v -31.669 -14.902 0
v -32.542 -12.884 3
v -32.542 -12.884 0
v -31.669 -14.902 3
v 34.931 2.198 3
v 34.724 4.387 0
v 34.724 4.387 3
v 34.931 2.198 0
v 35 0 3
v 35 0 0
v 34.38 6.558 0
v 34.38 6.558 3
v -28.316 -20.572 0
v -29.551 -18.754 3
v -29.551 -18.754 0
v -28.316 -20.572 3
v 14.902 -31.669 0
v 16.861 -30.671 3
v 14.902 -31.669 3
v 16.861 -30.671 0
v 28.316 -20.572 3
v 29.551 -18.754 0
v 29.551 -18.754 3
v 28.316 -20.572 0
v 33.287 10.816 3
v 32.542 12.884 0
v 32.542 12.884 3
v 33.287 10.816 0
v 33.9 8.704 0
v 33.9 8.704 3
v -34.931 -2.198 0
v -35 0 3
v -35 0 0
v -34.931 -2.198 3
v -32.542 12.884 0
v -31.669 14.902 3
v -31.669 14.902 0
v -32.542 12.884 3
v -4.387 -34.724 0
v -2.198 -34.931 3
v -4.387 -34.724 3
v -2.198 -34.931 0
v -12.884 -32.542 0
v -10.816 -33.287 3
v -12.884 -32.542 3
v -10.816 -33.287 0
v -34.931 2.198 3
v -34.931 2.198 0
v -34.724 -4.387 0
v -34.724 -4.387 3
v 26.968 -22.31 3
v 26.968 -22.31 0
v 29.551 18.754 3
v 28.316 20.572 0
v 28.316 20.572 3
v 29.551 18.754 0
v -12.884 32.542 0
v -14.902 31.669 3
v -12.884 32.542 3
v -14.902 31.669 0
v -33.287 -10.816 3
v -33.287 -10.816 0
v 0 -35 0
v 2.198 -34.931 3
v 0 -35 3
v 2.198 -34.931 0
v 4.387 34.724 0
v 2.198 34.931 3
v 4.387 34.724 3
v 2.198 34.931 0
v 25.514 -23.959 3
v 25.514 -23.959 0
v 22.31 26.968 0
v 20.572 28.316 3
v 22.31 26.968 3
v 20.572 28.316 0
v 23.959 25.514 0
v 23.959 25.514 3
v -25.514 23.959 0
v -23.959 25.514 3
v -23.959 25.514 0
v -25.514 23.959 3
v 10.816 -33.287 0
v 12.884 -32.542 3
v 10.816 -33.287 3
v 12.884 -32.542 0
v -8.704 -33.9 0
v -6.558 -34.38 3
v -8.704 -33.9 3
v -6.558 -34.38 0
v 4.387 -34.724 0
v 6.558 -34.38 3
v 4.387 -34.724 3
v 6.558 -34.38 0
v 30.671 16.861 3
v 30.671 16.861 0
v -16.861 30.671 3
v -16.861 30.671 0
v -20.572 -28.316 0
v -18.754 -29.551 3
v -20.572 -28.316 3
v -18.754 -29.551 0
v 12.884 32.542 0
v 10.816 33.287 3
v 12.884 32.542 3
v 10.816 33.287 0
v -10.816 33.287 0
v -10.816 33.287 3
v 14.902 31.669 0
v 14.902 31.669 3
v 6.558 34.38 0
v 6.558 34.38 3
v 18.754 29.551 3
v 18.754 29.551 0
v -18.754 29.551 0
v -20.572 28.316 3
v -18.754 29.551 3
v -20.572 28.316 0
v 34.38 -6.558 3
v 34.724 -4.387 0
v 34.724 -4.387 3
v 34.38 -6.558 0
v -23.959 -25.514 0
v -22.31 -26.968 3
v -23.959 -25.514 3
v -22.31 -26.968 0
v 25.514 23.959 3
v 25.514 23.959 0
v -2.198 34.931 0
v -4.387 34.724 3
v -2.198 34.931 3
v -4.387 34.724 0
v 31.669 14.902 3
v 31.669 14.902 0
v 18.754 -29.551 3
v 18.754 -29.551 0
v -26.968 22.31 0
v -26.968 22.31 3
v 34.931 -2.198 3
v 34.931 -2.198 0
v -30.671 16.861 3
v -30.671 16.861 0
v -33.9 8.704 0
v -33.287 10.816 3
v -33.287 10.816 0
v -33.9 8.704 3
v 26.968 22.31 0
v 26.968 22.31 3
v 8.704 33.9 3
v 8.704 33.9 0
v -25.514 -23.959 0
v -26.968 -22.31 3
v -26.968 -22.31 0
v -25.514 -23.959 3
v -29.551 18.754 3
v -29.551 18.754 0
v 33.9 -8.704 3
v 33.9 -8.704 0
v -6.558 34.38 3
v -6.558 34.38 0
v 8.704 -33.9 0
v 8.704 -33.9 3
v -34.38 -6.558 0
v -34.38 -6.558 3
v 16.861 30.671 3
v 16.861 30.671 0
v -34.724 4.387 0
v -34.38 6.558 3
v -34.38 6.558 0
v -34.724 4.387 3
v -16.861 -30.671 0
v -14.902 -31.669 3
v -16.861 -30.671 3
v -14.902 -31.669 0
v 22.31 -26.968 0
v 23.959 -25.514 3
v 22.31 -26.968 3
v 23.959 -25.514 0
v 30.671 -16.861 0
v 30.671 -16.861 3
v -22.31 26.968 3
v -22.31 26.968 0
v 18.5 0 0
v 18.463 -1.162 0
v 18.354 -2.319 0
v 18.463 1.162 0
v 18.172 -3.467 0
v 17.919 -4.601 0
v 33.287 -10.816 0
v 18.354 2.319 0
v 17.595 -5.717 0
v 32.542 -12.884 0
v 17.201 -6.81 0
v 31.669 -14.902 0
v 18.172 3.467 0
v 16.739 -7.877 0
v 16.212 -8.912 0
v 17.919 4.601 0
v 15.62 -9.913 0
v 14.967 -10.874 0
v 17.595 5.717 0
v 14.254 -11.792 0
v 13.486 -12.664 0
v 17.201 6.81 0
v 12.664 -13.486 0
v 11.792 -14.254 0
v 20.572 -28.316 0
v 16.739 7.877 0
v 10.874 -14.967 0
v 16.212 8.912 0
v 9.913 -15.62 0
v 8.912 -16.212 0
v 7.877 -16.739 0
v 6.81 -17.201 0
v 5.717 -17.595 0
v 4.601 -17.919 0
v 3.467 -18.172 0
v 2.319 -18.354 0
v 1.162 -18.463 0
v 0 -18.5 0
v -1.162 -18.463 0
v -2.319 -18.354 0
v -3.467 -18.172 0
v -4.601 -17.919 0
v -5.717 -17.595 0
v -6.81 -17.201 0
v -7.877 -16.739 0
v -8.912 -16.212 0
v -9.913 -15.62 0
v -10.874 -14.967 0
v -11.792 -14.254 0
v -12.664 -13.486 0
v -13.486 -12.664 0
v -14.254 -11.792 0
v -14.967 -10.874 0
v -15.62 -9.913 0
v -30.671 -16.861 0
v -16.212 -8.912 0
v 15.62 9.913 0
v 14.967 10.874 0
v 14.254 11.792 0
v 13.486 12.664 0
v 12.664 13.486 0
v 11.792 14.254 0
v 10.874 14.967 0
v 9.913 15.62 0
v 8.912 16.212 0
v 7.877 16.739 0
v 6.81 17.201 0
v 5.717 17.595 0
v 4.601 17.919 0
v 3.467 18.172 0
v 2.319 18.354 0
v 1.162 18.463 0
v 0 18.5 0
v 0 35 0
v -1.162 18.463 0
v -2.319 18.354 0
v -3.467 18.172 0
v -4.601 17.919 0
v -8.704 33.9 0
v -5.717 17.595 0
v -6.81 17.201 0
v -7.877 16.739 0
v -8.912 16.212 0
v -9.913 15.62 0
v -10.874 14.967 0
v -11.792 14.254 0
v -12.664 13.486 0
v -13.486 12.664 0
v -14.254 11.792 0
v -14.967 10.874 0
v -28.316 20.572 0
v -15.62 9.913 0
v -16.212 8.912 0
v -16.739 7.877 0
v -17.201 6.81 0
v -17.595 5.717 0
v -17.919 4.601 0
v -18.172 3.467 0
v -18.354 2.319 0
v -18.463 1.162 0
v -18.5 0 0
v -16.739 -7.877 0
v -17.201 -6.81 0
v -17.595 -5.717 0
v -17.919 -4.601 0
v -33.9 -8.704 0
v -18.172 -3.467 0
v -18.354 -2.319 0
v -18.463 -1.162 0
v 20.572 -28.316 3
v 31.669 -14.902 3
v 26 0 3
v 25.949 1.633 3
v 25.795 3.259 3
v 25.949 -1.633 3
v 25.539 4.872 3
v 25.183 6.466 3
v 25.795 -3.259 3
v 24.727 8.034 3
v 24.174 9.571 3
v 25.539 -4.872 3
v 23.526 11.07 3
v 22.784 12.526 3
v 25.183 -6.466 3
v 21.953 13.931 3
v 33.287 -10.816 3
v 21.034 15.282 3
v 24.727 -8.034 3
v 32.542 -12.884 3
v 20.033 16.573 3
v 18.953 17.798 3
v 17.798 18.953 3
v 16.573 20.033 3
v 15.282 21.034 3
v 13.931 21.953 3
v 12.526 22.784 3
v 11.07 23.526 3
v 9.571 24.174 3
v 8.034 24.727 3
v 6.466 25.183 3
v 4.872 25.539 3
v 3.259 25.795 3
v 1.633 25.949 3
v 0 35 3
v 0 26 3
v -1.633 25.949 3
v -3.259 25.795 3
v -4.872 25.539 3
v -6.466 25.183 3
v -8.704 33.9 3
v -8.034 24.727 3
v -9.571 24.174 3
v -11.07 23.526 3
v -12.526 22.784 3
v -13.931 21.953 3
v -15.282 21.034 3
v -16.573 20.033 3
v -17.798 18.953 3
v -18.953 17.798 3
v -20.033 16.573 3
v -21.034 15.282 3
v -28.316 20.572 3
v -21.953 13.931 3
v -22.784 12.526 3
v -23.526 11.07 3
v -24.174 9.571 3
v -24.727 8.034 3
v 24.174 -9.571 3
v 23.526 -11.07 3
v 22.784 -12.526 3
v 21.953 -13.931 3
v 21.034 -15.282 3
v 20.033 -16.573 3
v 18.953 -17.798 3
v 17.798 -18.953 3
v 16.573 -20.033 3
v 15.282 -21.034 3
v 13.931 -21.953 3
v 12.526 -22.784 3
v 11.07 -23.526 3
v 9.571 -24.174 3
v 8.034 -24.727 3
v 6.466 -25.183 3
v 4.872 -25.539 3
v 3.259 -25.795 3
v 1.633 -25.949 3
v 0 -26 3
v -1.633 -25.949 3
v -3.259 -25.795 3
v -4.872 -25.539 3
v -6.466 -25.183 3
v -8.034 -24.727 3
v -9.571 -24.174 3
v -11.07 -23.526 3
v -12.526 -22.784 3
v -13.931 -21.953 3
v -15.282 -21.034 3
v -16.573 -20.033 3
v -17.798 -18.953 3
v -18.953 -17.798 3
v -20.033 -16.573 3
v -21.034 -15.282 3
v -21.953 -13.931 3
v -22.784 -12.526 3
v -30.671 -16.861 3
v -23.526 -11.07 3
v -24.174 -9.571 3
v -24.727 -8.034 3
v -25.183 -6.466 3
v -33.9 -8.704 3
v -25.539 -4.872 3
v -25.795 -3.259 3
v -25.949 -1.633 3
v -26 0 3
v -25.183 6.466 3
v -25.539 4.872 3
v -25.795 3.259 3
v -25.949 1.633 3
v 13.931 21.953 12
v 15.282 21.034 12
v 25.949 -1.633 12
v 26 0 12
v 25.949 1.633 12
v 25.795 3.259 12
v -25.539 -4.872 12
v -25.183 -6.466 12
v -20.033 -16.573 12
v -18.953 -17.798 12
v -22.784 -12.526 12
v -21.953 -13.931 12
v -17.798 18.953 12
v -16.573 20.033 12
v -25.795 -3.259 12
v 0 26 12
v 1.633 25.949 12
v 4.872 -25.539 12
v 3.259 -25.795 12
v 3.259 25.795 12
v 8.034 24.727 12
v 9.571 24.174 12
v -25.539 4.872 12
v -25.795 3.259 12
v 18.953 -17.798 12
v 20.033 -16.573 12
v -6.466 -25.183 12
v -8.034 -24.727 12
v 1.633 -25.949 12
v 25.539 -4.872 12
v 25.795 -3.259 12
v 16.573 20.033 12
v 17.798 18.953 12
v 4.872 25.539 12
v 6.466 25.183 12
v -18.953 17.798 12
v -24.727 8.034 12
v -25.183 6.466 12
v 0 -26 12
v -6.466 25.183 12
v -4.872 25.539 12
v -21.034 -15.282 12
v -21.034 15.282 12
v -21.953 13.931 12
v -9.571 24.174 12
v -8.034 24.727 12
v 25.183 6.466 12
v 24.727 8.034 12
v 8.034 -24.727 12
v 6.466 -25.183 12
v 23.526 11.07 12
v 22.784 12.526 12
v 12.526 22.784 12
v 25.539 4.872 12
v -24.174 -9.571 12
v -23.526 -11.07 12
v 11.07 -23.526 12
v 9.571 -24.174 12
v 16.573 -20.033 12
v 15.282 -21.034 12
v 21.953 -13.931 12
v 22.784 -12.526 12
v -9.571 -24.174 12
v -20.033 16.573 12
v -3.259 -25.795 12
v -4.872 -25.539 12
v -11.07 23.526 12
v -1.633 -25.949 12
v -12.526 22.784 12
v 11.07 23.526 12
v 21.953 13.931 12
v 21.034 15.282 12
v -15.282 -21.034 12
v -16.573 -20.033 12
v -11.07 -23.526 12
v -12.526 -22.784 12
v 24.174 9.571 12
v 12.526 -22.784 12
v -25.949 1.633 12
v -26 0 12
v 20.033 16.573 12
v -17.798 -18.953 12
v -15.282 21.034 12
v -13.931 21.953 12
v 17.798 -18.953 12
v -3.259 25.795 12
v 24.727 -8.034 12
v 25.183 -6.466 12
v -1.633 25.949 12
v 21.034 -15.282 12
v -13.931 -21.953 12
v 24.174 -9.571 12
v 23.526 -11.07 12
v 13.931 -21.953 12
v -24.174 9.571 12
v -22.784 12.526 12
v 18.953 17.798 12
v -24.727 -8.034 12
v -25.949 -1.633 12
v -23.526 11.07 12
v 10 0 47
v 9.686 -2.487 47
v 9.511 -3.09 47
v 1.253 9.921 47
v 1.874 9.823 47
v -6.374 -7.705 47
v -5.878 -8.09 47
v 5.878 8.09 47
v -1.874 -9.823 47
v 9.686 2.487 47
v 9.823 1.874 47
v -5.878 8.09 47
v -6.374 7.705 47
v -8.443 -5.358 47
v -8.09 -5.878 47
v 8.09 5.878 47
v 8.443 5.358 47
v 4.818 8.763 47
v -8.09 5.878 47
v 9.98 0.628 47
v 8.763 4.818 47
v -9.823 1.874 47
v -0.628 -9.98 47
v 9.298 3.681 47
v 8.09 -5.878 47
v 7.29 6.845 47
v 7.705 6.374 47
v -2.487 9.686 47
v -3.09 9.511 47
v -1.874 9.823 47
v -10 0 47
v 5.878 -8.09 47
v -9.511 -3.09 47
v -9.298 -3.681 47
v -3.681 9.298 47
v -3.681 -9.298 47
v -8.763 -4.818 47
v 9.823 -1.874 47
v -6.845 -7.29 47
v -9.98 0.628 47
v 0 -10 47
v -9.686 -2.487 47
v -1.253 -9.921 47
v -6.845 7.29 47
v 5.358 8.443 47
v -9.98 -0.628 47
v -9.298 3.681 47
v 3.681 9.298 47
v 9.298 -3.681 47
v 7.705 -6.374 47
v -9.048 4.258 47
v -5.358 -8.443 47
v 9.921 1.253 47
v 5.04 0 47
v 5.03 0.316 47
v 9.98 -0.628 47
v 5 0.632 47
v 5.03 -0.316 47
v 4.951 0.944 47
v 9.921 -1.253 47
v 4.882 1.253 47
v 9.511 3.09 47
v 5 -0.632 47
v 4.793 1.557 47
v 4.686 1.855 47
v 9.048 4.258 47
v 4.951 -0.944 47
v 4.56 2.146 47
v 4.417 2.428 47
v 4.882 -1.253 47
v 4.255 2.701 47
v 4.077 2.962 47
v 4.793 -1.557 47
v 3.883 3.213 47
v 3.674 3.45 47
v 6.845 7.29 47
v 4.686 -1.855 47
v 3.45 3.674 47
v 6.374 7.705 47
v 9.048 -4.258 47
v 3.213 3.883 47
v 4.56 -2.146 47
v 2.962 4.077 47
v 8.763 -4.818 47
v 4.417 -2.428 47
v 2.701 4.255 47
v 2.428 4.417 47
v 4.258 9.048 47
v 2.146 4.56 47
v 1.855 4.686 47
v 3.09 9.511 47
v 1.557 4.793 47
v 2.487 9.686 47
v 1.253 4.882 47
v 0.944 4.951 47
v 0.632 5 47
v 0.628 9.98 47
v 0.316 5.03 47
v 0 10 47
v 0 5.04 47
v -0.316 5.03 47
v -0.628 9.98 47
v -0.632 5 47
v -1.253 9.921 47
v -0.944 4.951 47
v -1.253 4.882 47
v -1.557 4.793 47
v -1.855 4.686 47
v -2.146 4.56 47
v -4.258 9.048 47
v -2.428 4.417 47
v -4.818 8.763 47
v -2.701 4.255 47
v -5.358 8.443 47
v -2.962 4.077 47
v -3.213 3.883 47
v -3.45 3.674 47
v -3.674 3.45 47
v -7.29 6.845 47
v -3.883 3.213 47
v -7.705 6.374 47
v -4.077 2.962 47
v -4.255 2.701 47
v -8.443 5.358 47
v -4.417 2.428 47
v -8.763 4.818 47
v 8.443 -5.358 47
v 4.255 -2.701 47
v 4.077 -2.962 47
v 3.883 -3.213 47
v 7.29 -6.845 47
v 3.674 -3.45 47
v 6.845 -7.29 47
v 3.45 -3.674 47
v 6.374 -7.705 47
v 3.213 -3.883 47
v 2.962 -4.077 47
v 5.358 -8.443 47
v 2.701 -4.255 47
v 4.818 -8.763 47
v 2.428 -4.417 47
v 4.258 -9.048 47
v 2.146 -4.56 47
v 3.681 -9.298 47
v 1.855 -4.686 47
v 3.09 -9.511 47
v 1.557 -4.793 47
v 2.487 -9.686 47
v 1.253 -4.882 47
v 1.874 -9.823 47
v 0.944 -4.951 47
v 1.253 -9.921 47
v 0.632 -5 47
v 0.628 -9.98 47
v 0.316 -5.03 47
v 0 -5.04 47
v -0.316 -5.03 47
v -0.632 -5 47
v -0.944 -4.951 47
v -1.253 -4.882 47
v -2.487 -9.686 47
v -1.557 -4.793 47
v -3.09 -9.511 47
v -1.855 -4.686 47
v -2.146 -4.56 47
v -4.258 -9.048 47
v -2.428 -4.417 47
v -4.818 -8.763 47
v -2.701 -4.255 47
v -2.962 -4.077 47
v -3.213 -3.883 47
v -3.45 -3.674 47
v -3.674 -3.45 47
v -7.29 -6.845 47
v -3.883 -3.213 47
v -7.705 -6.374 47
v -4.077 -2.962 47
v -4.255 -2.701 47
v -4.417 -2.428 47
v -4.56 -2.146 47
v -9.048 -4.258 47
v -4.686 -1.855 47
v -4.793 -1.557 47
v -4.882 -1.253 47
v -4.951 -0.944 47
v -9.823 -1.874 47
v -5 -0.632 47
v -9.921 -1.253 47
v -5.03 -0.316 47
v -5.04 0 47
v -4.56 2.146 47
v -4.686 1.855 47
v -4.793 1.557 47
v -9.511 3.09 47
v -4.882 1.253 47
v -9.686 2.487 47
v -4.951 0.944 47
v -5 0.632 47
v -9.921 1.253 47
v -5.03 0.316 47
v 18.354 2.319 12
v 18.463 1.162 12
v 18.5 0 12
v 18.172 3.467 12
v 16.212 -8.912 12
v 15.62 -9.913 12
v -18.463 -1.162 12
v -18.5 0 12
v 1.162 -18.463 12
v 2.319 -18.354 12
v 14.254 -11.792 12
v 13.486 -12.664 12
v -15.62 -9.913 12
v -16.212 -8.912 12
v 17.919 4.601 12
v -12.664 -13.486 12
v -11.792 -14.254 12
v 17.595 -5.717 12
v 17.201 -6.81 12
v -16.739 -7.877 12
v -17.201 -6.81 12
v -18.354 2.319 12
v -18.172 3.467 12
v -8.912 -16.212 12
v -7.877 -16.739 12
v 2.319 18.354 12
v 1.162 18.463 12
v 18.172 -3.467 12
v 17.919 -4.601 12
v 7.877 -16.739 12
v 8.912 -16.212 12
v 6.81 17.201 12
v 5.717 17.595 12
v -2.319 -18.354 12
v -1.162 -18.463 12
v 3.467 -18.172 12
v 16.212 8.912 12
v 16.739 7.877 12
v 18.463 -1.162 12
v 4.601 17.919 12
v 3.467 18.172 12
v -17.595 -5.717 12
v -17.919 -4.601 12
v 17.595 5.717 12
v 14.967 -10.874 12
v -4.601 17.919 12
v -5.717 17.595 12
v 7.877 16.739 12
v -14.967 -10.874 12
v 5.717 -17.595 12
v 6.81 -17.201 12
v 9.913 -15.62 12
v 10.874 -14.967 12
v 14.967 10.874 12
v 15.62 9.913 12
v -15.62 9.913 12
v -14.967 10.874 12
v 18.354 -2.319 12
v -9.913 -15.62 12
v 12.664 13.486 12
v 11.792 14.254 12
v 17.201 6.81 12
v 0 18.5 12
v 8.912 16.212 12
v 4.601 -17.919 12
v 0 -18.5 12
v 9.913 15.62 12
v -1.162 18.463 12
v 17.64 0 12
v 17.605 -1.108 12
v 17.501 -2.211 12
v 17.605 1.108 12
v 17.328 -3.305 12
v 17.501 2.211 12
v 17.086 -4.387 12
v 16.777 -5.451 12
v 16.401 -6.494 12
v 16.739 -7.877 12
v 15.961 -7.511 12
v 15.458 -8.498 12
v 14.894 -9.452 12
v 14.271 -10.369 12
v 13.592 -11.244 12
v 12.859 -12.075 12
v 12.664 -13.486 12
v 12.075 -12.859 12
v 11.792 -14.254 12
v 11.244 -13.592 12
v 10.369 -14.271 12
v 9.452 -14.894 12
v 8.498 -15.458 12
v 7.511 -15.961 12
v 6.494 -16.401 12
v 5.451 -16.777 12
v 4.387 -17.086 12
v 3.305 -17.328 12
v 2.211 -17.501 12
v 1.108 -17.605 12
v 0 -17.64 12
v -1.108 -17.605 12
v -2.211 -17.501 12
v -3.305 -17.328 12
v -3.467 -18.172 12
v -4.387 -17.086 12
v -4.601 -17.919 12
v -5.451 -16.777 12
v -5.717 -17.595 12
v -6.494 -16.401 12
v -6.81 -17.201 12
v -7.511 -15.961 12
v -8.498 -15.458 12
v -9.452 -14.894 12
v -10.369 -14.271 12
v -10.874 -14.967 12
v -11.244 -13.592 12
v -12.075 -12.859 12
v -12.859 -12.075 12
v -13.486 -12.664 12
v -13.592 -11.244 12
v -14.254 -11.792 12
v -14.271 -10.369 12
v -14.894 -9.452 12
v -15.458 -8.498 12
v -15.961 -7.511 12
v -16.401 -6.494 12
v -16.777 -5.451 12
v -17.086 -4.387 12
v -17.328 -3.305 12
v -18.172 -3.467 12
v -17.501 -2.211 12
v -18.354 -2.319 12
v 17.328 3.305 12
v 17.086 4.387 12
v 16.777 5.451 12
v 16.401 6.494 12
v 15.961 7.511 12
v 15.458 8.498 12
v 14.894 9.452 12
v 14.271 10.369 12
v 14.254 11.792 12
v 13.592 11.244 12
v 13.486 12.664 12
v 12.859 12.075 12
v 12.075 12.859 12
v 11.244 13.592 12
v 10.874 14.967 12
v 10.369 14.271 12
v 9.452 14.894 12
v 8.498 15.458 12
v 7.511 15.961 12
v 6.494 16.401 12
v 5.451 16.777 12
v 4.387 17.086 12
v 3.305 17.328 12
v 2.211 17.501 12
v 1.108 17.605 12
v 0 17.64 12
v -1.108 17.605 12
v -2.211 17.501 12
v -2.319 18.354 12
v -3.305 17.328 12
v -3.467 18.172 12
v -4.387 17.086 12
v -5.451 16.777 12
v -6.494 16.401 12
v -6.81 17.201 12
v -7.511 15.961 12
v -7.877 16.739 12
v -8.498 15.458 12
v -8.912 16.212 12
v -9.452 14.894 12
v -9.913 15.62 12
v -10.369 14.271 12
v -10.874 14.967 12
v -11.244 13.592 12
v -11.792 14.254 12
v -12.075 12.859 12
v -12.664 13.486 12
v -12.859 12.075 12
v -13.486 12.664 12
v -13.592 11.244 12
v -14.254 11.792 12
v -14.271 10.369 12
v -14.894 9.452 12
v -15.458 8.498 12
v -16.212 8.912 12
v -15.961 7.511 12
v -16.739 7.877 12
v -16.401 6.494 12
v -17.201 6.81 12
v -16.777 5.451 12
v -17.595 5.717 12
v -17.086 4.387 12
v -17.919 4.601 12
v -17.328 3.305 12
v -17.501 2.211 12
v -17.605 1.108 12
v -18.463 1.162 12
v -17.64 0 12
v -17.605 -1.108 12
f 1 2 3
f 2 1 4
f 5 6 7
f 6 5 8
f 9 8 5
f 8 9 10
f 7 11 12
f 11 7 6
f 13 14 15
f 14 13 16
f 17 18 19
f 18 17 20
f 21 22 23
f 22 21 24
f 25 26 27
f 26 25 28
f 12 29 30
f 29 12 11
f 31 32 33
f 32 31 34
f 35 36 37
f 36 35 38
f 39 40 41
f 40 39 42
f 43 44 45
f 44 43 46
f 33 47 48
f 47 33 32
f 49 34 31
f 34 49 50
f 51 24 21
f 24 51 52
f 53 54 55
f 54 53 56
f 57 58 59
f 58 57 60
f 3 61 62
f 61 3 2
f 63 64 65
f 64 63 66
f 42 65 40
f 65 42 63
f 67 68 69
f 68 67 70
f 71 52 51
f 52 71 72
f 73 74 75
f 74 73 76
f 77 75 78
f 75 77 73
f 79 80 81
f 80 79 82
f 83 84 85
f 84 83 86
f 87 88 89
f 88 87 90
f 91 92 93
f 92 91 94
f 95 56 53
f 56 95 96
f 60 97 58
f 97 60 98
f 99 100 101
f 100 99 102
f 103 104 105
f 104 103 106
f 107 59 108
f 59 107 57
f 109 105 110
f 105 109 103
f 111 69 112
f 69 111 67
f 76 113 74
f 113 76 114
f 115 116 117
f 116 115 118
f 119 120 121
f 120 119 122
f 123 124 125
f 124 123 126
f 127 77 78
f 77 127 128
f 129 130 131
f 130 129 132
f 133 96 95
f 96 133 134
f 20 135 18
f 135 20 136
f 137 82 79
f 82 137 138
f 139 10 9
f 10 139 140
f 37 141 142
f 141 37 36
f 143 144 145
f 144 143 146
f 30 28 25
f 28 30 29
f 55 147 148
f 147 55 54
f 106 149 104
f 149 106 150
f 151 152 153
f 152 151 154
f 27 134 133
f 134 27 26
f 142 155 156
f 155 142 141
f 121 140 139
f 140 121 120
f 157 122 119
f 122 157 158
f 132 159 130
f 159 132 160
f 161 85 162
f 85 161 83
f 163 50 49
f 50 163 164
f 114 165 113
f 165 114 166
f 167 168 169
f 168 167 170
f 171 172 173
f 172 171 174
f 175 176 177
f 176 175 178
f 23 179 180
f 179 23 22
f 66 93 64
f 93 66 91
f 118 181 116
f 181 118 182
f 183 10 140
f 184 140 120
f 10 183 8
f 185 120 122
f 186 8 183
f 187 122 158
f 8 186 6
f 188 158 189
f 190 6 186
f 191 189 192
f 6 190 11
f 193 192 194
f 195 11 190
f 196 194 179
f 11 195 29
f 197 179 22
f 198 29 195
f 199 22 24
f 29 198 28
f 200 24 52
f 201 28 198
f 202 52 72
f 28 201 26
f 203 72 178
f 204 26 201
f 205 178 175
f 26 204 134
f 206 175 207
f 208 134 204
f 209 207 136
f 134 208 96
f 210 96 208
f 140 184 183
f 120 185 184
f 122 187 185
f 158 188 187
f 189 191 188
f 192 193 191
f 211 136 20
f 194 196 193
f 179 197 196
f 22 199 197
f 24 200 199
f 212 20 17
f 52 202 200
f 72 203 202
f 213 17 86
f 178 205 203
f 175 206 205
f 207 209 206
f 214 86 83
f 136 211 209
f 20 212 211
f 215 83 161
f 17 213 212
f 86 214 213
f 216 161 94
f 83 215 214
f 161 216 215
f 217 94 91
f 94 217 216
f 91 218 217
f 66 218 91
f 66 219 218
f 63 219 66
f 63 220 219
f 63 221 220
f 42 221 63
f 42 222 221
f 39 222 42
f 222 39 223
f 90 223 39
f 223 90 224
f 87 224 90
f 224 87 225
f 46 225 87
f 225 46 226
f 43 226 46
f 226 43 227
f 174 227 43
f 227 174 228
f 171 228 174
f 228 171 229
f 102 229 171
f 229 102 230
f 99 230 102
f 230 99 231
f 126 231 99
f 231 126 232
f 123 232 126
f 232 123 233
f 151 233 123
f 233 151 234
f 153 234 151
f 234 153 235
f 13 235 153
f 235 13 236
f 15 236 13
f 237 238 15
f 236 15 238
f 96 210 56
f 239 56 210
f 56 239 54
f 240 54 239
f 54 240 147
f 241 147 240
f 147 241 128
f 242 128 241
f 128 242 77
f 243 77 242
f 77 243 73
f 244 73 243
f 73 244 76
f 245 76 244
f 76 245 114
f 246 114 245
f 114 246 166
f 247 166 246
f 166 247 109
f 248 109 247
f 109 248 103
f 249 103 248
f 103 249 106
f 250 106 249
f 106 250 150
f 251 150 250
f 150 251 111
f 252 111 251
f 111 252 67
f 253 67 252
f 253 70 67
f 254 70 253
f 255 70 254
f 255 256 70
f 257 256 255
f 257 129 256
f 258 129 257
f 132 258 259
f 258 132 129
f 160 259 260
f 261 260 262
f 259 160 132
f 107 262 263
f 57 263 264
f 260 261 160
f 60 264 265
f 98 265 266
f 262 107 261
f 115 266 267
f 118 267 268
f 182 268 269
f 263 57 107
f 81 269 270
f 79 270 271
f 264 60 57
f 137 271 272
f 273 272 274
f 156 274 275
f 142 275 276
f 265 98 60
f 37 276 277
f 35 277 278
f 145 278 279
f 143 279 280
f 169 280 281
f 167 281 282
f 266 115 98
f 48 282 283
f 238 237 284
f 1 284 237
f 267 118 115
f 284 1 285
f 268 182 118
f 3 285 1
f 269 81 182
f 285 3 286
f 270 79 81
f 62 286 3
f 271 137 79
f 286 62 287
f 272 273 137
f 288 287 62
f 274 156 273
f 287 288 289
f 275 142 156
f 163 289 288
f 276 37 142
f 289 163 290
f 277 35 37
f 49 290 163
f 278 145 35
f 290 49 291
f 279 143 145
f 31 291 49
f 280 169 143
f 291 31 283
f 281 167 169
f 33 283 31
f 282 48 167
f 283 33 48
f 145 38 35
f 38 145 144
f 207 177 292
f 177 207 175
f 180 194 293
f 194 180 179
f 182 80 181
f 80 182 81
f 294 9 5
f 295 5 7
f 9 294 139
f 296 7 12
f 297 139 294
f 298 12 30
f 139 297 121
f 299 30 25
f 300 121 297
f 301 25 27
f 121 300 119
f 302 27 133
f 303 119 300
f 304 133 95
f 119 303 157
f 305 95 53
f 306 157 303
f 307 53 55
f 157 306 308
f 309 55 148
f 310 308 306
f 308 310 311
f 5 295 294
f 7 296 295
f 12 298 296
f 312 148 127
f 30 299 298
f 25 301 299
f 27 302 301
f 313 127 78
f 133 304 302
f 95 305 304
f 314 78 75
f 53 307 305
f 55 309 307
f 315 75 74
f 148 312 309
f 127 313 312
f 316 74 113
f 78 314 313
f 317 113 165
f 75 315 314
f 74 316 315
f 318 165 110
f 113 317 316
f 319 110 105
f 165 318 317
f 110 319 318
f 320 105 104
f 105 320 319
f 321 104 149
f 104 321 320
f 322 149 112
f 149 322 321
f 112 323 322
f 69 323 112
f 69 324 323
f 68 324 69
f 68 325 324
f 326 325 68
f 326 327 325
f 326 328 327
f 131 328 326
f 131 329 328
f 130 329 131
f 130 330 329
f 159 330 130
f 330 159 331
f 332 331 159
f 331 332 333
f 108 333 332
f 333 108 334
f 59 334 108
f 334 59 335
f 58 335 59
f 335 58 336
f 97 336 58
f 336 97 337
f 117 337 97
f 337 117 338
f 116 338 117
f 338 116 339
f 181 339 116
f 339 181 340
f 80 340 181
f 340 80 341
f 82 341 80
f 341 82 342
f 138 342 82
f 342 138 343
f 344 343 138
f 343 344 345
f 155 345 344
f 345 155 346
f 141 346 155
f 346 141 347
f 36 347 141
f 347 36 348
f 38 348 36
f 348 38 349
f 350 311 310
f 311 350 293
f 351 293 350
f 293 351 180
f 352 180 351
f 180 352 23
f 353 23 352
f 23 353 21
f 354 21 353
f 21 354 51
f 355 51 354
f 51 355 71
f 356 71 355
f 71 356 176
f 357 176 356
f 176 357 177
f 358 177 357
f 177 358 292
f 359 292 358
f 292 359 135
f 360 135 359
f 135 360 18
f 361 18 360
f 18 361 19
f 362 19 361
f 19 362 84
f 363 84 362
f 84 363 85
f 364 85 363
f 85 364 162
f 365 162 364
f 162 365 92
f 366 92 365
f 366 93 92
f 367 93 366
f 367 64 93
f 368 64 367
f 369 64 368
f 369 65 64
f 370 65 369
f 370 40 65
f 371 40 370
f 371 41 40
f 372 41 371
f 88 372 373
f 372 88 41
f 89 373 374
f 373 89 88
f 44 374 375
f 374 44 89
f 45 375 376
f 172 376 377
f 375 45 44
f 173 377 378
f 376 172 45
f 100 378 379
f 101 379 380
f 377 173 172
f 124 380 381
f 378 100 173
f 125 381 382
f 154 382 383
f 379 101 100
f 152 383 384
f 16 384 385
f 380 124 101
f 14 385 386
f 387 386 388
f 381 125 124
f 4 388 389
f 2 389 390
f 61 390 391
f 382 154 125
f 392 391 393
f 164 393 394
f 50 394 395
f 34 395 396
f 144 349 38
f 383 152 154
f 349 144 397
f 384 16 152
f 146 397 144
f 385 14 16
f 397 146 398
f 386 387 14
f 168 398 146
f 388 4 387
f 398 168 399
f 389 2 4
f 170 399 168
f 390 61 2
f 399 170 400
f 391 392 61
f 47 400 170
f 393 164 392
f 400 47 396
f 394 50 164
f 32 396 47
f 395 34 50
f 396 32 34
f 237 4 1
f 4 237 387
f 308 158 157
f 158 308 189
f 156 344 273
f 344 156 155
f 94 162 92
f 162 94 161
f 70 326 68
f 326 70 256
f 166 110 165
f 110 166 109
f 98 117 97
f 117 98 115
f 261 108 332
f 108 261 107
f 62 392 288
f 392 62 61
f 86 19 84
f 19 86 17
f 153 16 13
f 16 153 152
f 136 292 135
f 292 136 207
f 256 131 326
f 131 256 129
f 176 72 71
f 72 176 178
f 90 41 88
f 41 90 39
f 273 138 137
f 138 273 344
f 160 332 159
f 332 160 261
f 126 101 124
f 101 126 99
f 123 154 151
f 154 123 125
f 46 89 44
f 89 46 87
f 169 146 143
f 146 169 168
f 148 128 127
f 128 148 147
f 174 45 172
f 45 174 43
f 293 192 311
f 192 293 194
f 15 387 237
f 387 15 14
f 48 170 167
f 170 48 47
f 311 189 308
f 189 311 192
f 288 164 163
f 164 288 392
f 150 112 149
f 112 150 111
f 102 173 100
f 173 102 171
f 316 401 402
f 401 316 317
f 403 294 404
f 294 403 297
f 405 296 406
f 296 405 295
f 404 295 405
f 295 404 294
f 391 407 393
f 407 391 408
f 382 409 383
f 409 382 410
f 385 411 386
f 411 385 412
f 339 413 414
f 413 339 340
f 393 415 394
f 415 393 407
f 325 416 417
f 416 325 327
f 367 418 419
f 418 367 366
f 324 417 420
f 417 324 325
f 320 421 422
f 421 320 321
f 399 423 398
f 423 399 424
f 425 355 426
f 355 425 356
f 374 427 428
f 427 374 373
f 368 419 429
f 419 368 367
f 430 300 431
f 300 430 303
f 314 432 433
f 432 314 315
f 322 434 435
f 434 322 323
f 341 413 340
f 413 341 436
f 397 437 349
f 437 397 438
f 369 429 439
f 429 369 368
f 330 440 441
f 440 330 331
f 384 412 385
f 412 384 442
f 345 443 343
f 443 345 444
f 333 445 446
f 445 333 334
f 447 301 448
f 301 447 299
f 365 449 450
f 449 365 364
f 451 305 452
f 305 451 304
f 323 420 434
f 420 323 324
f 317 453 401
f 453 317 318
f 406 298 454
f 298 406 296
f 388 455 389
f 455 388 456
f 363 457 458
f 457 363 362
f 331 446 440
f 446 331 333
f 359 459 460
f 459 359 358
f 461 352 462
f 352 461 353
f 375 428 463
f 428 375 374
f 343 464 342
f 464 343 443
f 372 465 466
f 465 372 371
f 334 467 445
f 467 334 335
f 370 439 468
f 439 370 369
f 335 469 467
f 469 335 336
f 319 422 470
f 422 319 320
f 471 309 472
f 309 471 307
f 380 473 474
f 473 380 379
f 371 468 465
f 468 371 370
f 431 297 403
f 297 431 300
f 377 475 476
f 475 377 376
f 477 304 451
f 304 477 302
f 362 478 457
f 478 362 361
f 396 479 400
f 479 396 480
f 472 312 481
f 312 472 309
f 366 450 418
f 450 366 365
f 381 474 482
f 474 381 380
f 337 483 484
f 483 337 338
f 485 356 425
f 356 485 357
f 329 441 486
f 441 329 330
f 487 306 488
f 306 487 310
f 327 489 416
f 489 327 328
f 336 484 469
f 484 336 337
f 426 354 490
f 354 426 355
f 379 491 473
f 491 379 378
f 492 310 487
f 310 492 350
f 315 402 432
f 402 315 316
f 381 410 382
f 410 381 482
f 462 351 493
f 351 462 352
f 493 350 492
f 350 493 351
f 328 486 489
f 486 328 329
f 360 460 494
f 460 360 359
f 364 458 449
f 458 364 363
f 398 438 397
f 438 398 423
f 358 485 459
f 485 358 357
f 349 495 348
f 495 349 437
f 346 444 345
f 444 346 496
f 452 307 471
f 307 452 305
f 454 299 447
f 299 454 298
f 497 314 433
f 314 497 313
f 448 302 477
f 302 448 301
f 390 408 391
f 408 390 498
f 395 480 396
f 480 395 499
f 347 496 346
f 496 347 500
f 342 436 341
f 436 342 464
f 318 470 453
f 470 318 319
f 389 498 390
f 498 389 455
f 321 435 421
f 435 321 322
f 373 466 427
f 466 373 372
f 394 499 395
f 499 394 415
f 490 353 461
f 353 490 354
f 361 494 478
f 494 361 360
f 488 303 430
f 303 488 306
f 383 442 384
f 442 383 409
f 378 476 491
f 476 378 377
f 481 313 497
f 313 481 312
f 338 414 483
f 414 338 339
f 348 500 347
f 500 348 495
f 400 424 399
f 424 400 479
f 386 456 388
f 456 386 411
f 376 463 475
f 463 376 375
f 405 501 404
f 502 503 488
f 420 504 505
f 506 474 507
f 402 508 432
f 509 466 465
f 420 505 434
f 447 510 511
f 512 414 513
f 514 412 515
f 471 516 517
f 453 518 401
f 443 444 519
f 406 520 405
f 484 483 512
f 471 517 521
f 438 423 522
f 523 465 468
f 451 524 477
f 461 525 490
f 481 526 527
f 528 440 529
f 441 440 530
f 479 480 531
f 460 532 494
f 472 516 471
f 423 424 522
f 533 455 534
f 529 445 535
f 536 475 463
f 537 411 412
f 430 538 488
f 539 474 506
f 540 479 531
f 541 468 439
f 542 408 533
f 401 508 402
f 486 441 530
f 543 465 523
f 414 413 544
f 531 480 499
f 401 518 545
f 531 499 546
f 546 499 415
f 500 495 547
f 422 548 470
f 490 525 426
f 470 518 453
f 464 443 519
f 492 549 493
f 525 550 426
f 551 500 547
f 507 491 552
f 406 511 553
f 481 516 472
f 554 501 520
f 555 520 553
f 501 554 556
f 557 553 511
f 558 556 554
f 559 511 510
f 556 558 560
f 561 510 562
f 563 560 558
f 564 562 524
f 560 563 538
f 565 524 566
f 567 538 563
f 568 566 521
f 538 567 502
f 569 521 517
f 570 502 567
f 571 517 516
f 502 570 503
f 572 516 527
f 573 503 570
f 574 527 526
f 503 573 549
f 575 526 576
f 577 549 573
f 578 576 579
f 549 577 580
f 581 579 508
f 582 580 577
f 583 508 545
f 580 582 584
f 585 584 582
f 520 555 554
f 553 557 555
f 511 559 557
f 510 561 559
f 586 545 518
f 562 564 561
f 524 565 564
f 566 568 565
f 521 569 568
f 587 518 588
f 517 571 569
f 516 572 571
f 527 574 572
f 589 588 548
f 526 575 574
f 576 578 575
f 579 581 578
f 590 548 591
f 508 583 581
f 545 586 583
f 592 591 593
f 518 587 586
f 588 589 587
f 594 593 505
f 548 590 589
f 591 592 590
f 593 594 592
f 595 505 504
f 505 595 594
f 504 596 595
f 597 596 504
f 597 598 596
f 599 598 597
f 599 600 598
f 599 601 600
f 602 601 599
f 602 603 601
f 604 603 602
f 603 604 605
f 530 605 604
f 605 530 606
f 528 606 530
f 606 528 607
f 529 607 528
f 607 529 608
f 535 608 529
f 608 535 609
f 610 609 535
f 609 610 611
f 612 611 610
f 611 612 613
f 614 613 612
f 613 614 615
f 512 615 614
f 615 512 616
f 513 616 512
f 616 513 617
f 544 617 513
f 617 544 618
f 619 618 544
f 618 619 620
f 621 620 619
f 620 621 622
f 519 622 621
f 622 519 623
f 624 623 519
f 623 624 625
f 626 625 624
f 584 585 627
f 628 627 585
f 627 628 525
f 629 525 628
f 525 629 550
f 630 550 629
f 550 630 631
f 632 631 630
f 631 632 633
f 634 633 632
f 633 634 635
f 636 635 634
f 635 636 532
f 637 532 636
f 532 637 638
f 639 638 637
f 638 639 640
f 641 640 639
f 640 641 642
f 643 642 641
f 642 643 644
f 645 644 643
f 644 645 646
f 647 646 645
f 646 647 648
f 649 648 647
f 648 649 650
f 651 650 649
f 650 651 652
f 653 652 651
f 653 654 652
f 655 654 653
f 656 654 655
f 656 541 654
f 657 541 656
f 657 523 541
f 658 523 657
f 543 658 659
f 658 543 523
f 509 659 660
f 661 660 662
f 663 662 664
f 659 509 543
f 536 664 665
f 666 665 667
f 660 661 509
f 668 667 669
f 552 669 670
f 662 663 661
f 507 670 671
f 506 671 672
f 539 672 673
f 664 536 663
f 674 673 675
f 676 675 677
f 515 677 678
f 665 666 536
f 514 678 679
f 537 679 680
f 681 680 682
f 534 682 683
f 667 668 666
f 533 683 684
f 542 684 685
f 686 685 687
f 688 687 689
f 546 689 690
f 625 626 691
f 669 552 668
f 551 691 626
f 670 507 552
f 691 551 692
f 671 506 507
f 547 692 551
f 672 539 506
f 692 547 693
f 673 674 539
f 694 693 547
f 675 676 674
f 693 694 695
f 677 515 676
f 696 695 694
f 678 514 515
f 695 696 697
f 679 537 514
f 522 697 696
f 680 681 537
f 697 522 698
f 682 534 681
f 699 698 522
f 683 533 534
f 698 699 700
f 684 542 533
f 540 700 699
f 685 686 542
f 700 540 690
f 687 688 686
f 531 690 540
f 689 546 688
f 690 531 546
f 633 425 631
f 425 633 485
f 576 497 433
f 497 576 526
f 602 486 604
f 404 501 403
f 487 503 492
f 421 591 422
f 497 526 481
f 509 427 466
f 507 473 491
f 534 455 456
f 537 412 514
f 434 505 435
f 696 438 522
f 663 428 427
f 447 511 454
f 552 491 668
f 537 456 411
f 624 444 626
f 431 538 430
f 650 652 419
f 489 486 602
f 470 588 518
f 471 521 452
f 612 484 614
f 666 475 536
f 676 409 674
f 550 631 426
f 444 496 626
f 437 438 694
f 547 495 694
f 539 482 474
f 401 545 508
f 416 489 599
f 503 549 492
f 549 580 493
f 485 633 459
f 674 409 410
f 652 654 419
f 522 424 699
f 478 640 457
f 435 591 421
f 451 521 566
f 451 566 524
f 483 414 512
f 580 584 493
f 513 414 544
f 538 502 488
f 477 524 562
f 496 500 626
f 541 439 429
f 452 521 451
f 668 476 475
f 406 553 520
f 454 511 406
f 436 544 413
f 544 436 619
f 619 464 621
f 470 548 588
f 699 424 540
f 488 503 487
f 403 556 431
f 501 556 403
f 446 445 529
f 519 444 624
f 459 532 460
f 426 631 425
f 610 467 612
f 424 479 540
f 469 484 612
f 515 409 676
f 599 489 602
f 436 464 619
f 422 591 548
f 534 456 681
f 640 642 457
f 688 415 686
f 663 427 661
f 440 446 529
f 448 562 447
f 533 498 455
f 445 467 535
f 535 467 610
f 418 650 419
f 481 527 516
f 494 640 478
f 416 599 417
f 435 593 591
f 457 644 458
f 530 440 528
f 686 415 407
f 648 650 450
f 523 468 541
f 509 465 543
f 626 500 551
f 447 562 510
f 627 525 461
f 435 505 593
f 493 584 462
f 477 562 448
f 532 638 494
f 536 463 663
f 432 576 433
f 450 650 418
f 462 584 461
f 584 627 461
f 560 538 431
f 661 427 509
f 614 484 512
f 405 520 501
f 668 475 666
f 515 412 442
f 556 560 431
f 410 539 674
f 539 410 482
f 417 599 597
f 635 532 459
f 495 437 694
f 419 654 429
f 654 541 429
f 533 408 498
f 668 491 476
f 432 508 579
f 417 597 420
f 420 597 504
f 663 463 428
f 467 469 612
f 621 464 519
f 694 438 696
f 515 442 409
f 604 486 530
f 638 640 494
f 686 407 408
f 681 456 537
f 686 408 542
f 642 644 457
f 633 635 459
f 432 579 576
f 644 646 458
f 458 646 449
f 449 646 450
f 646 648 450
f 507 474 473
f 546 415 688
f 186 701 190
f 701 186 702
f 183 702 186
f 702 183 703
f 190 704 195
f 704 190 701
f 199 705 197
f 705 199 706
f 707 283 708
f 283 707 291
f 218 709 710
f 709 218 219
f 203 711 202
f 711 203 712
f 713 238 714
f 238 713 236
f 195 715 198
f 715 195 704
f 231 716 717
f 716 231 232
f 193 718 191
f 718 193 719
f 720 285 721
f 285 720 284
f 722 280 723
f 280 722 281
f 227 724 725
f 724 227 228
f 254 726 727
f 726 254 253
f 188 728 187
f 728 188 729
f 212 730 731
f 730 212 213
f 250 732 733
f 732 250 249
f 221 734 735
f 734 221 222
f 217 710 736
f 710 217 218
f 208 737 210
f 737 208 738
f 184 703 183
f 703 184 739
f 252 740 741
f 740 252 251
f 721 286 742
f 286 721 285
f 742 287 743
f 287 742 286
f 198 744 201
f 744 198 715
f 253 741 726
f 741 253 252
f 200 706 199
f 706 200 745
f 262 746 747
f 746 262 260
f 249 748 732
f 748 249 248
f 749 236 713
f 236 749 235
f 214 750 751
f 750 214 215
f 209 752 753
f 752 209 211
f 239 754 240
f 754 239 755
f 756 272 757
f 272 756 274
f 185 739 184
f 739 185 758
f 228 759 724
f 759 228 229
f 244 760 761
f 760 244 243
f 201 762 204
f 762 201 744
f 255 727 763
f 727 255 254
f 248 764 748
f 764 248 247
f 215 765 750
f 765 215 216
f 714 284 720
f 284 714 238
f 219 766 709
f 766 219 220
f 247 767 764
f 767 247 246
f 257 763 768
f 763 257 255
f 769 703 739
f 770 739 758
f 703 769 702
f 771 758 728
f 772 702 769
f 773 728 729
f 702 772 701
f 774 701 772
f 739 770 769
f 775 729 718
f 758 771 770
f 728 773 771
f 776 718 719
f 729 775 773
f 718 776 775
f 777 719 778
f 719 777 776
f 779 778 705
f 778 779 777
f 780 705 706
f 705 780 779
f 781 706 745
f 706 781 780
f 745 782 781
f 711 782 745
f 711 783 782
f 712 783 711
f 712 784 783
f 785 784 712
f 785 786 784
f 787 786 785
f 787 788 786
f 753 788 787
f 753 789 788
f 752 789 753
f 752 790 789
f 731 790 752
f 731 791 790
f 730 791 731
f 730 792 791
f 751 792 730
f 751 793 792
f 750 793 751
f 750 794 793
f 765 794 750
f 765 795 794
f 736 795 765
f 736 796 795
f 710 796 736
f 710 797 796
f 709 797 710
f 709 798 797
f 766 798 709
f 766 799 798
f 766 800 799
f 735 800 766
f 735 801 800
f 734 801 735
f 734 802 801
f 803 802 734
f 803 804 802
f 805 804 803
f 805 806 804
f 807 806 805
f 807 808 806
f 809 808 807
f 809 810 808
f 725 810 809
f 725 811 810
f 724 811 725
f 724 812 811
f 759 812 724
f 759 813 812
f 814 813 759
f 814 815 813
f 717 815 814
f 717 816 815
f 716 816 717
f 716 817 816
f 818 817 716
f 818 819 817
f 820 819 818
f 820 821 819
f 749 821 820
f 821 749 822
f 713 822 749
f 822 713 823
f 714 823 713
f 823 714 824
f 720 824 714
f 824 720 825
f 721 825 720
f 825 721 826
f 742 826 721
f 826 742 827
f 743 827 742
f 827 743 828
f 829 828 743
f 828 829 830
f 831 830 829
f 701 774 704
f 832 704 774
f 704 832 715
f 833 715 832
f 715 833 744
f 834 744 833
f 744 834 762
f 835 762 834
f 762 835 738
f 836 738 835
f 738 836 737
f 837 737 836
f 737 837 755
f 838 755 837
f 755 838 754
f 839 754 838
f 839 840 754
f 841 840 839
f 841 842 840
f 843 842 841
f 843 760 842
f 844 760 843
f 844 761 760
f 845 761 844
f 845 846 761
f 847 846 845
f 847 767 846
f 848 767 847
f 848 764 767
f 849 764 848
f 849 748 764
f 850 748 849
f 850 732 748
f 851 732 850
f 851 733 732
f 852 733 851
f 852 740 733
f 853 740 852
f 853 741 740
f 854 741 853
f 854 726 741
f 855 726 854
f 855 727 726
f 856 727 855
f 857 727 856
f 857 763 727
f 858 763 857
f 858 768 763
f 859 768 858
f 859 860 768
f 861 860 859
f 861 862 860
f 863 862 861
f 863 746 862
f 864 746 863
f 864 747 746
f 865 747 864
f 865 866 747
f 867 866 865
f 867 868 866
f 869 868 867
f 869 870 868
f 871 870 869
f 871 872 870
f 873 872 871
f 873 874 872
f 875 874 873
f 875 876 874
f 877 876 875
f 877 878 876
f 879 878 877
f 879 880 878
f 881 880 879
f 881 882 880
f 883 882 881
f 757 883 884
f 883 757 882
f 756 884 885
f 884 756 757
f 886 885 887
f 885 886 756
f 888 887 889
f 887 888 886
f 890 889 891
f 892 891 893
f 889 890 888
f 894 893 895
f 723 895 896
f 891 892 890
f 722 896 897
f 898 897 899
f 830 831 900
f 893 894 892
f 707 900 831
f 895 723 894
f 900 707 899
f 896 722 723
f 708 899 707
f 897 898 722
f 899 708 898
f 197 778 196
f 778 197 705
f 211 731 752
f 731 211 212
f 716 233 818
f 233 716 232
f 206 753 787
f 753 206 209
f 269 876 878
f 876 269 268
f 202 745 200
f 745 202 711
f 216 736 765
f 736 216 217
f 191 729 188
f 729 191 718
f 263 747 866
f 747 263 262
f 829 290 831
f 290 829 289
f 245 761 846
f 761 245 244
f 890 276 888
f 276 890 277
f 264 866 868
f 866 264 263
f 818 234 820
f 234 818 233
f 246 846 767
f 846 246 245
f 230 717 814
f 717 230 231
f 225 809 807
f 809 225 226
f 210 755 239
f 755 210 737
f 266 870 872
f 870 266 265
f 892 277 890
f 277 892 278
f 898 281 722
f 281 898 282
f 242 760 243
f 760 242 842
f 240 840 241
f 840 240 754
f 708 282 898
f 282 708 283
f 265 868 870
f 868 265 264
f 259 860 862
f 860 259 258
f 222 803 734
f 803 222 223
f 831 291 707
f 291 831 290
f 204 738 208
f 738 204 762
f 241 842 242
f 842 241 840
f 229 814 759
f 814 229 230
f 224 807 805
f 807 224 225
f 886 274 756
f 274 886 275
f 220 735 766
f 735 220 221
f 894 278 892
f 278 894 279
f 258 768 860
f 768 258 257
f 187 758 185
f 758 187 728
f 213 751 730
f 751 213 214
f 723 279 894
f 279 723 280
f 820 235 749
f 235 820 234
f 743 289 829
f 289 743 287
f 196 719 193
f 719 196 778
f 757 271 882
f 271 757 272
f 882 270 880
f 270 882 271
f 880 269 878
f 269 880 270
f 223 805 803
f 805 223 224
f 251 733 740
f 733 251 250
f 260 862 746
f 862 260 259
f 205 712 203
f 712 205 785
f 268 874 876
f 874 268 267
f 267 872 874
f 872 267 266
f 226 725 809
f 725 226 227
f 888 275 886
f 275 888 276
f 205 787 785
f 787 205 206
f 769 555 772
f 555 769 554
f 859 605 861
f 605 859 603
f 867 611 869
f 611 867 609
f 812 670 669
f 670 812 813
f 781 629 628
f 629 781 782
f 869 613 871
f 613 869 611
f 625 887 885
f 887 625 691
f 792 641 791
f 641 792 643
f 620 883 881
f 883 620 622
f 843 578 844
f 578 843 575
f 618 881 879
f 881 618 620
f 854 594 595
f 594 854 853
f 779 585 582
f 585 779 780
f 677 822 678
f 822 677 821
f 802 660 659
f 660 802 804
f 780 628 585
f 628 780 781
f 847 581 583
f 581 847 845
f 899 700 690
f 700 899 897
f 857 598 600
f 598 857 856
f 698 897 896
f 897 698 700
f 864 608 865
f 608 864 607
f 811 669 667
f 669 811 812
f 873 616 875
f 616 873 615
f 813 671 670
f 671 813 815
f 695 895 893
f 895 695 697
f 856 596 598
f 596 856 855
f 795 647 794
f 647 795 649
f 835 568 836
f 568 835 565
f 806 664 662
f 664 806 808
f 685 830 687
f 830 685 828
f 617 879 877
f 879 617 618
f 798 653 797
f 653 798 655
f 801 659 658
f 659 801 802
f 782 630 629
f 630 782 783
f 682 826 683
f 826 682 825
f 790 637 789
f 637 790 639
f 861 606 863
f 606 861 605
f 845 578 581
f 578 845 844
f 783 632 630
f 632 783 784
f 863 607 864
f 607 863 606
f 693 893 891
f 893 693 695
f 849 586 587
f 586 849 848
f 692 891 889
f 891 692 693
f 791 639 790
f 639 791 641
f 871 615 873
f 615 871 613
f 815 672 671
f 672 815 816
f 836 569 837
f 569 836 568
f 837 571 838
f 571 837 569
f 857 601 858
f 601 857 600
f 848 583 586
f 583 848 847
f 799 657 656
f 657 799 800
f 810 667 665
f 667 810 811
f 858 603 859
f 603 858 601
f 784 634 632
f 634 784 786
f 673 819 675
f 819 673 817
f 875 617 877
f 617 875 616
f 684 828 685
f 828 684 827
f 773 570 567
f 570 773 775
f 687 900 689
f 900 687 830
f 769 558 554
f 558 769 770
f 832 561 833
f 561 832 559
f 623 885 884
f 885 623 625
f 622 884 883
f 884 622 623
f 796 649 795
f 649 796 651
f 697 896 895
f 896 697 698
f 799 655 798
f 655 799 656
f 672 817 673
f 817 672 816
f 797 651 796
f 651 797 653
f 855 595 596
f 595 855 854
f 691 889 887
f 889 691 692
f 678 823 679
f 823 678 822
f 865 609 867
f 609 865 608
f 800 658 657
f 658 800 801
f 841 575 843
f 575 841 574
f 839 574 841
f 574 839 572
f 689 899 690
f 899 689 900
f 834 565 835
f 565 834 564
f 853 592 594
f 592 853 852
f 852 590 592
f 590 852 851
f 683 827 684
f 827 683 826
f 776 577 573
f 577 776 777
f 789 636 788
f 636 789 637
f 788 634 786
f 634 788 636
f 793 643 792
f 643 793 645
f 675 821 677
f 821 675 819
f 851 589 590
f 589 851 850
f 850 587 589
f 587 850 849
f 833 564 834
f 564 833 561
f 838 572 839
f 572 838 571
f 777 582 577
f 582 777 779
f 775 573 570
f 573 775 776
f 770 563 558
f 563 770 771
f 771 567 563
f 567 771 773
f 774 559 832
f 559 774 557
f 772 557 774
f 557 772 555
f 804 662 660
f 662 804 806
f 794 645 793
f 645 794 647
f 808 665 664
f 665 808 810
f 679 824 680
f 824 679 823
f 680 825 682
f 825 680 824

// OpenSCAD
THICKNESS = 3;
HEIGHT = 50;
BEARING_OUTER_DIAMETER = 37;
BEARING_THICKNESS = 12;
PLATFORM_DIAMETER = 70;
LIP_HEIGHT = BEARING_THICKNESS;
LIP_DIAMETER = 52;
LIP_TOP_DIAMETER = 20;

$fn = 100;

difference() {
    union() {
        cylinder(h = THICKNESS, d = PLATFORM_DIAMETER);
        cylinder(h = LIP_HEIGHT, d = LIP_DIAMETER);
        translate([0, 0, LIP_HEIGHT])
            cylinder(h = HEIGHT - THICKNESS - BEARING_THICKNESS, d1 = LIP_DIAMETER, d2 = LIP_TOP_DIAMETER);
    }
    union() {
        translate([0, 0, -1])
            cylinder(h = BEARING_THICKNESS+1, d =      BEARING_OUTER_DIAMETER);
        translate([0, 0, BEARING_THICKNESS-1])
            cylinder(h = HEIGHT, d1 = BEARING_OUTER_DIAMETER-1, d2 = 0);
    }
}
